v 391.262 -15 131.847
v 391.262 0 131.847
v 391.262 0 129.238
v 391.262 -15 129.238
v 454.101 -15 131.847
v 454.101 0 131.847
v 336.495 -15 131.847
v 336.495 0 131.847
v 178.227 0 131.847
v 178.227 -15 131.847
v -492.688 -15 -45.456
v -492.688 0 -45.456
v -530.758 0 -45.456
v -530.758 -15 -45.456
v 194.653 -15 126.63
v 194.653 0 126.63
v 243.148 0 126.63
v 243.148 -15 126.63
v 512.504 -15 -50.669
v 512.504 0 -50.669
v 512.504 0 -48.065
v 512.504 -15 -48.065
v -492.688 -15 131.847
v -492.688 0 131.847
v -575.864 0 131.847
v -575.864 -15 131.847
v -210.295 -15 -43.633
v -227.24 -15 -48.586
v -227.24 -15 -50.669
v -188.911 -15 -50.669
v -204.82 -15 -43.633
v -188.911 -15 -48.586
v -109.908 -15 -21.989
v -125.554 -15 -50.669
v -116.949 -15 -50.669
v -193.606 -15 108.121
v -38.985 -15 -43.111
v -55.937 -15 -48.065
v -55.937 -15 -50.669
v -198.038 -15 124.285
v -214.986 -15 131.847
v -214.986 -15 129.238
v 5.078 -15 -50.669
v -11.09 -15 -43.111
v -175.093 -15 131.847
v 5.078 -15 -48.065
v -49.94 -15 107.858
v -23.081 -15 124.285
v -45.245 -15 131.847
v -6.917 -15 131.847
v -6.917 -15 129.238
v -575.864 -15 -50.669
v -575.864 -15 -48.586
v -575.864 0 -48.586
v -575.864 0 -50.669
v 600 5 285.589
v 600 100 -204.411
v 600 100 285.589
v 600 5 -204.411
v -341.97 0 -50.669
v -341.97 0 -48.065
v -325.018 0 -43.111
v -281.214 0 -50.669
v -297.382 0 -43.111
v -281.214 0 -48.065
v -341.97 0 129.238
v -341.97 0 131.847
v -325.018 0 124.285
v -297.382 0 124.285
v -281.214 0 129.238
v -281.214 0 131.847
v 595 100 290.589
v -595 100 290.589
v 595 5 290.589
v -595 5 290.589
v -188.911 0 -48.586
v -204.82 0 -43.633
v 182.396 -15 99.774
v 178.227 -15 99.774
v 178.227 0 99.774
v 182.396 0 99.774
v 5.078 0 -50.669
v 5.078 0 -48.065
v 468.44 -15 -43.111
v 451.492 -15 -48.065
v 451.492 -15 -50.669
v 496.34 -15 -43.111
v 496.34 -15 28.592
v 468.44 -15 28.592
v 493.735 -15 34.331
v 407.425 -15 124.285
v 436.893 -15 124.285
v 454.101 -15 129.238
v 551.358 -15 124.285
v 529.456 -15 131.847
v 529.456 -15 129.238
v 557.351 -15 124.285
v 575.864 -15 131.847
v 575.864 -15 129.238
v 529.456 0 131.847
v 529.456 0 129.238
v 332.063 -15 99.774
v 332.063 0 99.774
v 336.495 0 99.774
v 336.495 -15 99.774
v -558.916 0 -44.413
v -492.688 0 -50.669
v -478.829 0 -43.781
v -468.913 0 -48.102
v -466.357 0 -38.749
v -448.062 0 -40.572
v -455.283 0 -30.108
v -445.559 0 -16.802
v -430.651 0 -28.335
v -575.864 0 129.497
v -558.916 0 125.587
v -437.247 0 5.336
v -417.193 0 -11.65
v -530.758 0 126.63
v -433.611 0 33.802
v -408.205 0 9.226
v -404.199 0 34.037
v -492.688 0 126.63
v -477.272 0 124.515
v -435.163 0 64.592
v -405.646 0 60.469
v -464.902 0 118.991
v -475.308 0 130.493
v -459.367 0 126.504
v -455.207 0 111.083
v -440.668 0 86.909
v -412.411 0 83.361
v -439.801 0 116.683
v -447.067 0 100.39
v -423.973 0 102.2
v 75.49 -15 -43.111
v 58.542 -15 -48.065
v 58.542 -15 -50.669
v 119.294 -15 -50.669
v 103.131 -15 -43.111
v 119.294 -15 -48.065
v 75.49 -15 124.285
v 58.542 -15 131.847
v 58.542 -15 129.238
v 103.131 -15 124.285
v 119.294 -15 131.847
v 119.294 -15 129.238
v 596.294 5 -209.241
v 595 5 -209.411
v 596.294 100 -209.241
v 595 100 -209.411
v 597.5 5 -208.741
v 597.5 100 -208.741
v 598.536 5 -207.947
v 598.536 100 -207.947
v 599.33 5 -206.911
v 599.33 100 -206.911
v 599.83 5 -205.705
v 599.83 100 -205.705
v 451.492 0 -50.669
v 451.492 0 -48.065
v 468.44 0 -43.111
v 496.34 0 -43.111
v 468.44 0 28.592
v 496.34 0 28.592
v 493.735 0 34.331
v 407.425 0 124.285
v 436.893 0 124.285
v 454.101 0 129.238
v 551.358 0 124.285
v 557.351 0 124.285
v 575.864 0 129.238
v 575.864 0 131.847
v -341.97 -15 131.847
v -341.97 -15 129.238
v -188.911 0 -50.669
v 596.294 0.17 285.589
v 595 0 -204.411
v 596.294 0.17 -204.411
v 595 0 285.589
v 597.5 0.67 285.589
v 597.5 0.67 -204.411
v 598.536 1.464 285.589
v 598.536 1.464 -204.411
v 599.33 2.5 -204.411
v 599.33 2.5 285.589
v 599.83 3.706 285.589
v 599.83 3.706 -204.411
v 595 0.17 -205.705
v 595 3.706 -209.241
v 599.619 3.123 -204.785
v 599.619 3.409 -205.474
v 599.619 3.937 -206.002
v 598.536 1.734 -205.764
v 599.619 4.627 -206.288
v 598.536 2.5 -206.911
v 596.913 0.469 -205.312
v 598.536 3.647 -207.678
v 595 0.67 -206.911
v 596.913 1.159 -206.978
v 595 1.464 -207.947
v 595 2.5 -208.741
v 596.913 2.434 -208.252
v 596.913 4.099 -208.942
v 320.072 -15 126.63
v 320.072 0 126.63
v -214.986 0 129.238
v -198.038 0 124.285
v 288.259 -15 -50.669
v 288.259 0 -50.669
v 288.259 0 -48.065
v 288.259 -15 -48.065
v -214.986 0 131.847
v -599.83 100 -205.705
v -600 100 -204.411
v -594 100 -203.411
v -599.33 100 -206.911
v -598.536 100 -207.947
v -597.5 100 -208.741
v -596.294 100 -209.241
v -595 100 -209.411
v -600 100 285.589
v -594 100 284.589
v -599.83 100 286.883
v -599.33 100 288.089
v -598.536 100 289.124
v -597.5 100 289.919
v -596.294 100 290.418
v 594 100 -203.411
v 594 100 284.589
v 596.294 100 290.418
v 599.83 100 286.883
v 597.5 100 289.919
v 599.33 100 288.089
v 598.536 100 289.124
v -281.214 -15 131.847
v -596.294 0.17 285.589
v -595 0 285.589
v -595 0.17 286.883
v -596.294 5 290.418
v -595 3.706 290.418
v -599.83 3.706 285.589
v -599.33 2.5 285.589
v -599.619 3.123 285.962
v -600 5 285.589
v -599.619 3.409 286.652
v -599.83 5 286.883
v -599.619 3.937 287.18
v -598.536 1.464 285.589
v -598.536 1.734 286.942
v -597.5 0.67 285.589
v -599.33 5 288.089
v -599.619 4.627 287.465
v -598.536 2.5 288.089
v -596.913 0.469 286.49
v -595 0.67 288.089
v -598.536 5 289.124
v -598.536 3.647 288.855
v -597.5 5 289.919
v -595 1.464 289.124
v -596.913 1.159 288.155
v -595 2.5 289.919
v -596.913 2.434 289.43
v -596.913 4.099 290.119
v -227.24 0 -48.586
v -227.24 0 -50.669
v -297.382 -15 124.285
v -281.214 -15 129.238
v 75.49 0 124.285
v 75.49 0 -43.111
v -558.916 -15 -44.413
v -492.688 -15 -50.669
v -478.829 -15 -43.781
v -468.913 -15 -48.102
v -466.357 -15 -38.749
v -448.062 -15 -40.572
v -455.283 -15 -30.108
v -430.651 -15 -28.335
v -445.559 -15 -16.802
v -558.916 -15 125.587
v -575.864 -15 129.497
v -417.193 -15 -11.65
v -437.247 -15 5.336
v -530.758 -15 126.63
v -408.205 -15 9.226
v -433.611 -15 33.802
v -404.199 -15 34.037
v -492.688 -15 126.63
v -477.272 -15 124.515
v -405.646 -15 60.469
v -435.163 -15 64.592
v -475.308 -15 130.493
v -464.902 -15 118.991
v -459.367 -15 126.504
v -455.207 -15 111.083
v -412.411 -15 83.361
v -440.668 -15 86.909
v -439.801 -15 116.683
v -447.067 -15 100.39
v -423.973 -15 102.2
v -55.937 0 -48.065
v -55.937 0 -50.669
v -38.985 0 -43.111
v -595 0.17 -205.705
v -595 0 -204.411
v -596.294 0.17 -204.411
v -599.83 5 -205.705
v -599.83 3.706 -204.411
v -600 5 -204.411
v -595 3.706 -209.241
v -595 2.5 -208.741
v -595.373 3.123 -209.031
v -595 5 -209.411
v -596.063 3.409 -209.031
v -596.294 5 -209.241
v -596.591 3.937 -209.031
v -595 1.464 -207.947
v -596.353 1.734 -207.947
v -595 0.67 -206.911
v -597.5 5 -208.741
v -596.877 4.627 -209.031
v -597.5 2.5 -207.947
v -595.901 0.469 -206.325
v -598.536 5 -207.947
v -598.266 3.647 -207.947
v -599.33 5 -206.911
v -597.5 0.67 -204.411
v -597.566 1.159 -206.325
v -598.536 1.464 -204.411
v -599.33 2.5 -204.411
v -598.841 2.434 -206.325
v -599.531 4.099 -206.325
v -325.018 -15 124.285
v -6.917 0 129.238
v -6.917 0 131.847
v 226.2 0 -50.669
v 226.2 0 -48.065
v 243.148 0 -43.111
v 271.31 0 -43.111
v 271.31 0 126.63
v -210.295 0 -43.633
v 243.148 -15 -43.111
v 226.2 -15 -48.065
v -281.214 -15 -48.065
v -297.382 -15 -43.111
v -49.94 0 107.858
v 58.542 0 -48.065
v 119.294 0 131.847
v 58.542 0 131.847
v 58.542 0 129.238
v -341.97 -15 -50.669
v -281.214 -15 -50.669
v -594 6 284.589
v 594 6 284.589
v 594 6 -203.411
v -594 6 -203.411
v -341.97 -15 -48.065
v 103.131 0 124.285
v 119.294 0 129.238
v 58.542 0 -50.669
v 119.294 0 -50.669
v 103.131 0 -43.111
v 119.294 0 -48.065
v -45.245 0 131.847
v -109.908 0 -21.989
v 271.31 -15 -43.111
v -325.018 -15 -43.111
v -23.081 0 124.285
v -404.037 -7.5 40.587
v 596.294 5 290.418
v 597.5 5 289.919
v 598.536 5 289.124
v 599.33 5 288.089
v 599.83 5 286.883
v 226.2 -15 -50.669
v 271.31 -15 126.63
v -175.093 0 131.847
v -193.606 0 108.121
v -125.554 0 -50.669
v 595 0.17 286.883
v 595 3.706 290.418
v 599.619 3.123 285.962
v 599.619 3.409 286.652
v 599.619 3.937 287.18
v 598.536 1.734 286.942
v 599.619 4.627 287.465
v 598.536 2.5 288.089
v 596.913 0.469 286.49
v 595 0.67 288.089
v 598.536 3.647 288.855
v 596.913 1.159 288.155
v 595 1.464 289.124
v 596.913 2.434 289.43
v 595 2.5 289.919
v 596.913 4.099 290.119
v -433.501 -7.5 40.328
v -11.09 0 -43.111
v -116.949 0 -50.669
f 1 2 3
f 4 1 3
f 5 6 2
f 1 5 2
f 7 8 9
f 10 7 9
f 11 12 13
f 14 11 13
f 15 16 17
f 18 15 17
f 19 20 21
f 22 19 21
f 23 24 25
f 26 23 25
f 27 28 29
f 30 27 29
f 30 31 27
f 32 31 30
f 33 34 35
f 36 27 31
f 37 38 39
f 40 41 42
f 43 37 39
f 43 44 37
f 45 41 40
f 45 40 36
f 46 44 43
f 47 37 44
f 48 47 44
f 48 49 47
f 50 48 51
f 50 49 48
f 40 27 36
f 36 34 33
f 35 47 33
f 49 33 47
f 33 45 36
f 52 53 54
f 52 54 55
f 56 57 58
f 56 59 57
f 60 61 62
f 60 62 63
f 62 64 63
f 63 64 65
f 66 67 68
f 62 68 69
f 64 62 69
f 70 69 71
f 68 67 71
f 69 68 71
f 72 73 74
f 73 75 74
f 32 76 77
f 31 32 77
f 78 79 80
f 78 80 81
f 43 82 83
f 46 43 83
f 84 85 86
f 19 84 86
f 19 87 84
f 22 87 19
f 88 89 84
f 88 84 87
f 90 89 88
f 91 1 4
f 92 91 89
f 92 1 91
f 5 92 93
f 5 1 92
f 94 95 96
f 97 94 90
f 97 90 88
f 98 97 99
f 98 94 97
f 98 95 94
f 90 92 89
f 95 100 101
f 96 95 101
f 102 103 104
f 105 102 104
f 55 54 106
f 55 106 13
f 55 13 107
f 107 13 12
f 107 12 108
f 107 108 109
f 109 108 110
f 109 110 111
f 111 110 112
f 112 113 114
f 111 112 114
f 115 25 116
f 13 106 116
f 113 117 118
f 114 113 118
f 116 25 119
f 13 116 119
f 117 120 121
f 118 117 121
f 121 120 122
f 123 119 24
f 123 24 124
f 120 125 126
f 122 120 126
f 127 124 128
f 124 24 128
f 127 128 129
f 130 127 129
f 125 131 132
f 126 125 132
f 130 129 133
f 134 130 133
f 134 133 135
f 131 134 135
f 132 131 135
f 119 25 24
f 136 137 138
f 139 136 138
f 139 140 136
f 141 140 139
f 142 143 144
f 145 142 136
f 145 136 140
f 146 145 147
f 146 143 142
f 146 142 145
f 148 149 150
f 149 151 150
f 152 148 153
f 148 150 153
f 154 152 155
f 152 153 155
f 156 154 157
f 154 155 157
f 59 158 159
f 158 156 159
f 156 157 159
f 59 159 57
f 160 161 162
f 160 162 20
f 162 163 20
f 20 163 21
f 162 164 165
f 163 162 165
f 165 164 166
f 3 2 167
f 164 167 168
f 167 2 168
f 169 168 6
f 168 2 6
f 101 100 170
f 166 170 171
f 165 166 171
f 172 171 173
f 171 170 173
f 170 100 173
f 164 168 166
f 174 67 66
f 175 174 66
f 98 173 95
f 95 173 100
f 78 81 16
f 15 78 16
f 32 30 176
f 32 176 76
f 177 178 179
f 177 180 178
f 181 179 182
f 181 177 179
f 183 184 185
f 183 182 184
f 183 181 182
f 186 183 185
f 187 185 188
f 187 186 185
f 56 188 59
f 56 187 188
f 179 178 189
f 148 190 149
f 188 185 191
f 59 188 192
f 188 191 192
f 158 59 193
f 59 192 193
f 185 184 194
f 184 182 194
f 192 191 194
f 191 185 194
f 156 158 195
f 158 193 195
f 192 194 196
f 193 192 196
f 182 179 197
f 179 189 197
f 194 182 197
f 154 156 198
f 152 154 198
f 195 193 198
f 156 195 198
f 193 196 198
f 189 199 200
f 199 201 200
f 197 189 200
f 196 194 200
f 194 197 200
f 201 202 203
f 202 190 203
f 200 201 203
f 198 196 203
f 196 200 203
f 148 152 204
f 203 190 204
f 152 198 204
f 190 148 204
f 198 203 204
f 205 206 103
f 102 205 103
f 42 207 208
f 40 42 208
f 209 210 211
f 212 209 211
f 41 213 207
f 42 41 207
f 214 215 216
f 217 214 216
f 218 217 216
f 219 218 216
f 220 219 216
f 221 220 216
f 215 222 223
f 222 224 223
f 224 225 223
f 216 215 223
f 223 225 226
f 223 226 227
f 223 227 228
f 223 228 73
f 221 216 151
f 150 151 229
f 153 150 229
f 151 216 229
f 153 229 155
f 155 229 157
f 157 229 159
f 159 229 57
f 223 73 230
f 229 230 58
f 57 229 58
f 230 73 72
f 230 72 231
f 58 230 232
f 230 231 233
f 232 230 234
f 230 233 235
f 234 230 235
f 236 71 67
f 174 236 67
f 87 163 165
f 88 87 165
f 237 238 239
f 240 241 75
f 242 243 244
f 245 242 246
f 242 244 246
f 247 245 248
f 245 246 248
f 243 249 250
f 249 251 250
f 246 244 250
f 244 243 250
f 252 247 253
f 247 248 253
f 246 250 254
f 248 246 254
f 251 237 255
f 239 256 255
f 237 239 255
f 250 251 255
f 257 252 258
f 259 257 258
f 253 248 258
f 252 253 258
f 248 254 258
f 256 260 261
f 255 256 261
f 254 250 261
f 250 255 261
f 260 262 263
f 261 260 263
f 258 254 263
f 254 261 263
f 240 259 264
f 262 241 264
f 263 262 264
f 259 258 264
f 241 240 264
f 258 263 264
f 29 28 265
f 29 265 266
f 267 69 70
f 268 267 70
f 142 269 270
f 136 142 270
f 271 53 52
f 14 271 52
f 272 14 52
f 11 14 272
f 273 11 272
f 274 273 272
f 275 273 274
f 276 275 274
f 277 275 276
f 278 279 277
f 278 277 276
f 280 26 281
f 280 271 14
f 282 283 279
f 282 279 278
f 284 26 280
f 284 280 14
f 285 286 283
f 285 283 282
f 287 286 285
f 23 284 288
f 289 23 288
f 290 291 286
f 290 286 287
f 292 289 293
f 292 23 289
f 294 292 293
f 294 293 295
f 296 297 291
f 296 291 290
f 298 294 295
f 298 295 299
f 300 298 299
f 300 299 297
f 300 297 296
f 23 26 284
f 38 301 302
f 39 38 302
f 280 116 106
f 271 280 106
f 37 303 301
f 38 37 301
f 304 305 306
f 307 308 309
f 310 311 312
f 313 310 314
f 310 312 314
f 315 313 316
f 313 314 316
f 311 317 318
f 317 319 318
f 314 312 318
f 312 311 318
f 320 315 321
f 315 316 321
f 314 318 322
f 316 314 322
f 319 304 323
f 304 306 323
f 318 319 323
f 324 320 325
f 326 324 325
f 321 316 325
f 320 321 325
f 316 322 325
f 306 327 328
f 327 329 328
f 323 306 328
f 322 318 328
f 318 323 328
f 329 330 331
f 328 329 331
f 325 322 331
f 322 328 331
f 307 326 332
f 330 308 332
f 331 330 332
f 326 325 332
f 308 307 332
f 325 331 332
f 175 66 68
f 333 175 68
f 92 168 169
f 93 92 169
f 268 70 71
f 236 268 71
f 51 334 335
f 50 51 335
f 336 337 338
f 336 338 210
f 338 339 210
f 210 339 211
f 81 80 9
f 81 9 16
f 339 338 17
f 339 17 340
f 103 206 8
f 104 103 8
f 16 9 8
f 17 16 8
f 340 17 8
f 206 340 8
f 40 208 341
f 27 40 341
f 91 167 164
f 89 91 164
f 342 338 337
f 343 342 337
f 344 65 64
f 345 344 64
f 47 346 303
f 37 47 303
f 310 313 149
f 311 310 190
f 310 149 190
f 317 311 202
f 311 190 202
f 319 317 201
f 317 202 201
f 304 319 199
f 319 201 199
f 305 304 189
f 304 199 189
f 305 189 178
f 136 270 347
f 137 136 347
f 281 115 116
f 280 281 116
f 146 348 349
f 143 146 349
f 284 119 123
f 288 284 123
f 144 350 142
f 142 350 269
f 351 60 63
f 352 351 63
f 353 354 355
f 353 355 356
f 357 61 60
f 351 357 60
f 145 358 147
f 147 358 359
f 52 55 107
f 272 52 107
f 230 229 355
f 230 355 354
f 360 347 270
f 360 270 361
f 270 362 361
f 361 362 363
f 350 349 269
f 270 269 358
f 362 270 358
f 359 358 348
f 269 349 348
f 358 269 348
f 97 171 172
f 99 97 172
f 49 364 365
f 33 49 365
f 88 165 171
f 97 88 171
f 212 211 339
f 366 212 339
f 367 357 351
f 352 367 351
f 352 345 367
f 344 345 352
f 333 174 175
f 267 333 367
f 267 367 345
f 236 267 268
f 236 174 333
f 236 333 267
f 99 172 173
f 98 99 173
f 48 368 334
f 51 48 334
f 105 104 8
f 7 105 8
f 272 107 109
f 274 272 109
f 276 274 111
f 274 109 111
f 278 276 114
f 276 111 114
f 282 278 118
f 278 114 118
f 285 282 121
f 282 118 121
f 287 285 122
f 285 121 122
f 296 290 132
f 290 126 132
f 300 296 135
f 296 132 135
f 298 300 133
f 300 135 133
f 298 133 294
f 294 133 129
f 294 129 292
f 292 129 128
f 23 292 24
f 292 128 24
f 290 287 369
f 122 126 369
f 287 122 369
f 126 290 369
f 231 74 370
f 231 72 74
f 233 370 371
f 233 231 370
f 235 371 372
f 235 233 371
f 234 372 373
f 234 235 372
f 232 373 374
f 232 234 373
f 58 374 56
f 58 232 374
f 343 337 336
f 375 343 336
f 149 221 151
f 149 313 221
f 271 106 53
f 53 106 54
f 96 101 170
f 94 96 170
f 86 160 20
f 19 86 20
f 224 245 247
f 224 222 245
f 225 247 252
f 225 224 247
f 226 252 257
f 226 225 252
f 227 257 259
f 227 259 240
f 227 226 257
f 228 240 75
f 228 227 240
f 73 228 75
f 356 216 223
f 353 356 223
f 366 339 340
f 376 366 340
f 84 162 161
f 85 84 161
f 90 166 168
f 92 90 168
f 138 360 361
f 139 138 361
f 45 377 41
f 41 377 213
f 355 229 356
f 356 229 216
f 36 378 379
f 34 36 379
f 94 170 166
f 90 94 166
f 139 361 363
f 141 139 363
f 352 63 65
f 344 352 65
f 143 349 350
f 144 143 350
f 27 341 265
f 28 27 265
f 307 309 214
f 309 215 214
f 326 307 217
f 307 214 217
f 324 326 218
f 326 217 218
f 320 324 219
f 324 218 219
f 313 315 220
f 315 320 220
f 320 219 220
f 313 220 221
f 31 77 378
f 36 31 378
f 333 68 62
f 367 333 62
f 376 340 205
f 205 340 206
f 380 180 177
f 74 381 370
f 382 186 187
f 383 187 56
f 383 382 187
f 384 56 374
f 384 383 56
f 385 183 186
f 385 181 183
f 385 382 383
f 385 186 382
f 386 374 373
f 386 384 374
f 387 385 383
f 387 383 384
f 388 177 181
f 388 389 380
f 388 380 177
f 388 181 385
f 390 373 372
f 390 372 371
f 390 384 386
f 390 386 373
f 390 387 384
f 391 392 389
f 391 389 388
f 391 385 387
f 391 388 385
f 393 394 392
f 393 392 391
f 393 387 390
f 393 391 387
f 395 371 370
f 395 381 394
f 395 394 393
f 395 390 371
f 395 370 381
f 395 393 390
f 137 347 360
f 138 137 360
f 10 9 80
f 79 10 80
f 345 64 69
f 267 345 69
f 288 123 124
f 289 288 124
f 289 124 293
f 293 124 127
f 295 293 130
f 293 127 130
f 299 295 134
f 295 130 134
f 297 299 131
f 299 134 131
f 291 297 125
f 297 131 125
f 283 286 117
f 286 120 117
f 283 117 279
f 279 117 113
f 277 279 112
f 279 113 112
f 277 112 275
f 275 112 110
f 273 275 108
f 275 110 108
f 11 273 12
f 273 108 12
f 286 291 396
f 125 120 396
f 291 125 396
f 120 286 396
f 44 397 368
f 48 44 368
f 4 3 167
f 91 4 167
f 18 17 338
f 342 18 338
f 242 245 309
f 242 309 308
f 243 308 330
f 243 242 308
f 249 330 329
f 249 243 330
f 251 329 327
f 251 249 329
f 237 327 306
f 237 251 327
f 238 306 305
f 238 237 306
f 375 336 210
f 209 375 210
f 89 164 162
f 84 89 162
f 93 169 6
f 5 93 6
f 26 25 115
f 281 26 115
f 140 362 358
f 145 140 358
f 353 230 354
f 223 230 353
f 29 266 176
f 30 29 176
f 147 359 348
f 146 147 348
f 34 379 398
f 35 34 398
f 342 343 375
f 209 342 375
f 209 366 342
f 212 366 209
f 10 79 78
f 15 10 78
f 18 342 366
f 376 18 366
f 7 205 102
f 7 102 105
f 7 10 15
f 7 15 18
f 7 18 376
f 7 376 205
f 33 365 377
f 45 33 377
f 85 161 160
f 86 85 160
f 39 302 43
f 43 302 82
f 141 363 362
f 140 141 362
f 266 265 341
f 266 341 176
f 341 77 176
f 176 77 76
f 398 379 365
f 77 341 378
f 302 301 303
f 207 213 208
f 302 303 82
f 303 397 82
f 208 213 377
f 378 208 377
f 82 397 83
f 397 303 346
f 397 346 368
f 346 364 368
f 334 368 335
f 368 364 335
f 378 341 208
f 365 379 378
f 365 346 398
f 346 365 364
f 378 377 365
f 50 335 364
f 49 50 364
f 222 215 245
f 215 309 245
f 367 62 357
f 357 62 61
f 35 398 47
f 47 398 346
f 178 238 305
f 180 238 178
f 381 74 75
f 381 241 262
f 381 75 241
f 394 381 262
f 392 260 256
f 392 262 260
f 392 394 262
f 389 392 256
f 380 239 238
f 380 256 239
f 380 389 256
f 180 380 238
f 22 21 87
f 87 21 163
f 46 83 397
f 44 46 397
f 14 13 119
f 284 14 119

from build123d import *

# Parameters (mm, degrees)
F1_DEPTH = 15
F2_W     = 1200
F2_H     = 500
F3_DEPTH = 100
F5_W     = 1188
F5_H     = 488
F6_DEPTH = 94
F7_R     = 5


with BuildPart() as f1:
    # F0 (on Front) → F1 (new body)
    with BuildSketch(Plane.XZ):
        with BuildLine():
            Line((-492.688128328, 131.8467284969), (-575.8642325067, 131.8467284969))
            Line((-575.8642325067, 131.8467284969), (-575.8642325067, 129.4973567609))
            Line((-575.8642325067, 129.4973567609), (-558.9160195401, 125.5868167992))
            Line((-558.9160195401, 125.5868167992), (-558.9160195401, -44.4131832008))
            Line((-558.9160195401, -44.4131832008), (-575.8642325067, -48.5864438502))
            Line((-575.8642325067, -48.5864438502), (-575.8642325067, -50.6692748381))
            Line((-575.8642325067, -50.6692748381), (-492.688128328, -50.6692748381))
            add(Edge.make_bspline(
                [(-492.688128328, -50.6692748381), (-440.5398678839, -50.6692748381), (-404.0365235328, -16.7765100838), (-404.0365235328, 40.5868167992)],
                knots=[0, 0, 0, 0, 1, 1, 1, 1], degree=3))
            add(Edge.make_bspline(
                [(-404.0365235328, 40.5868167992), (-404.0365235328, 97.4286398014), (-440.5398678839, 131.8467284969), (-492.688128328, 131.8467284969)],
                knots=[0, 0, 0, 0, 1, 1, 1, 1], degree=3))
        make_face()
        with BuildLine():
            Line((-530.7578425423, -45.4564880014), (-530.7578425423, 126.6301423233))
            Line((-530.7578425423, 126.6301423233), (-492.688128328, 126.6301423233))
            add(Edge.make_bspline(
                [(-492.688128328, 126.6301423233), (-458.2686649634, 126.6301423233), (-433.5007536503, 97.9495426962), (-433.5007536503, 40.3278954484)],
                knots=[0, 0, 0, 0, 1, 1, 1, 1], degree=3))
            add(Edge.make_bspline(
                [(-433.5007536503, 40.3278954484), (-433.5007536503, -17.0354314346), (-458.2686649634, -45.4564880014), (-492.688128328, -45.4564880014)],
                knots=[0, 0, 0, 0, 1, 1, 1, 1], degree=3))
            Line((-492.688128328, -45.4564880014), (-530.7578425423, -45.4564880014))
        make_face(mode=Mode.SUBTRACT)
    extrude(amount=F1_DEPTH)


with BuildPart() as f1b:
    # F0 (on Front) → F1, piece 2 (new body)
    with BuildSketch(Plane.XZ):
        Polygon((-281.214325751, 131.8467284969), (-341.9704949597, 131.8467284969), (-341.9704949597, 129.2384354101), (-325.0184757483, 124.2845699242), (-325.0184757483, -43.1109363259), (-341.9704949597, -48.0647810881), (-341.9704949597, -50.6692748381), (-281.214325751, -50.6692748381), (-281.214325751, -48.0647810881), (-297.381940789, -43.1109363259), (-297.381940789, 124.2845699242), (-281.214325751, 129.2384354101), align=None)
    extrude(amount=F1_DEPTH)


with BuildPart() as f1c:
    # F0 (on Front) → F1, piece 3 (new body)
    with BuildSketch(Plane.XZ):
        Polygon((-175.0928314113, 131.8467284969), (-214.986434539, 131.8467284969), (-214.986434539, 129.2384354101), (-198.0382215723, 124.2845699242), (-210.2953104643, -43.6325990879), (-227.2397240942, -48.5864438502), (-227.2397240942, -50.6692748381), (-188.9110885291, -50.6692748381), (-188.9110885291, -48.5864438502), (-204.8197960321, -43.6325990879), (-193.6060326642, 108.120754223), (-125.5542525388, -50.6692748381), (-116.948761534, -50.6692748381), (-49.9403069328, 107.8580128117), (-38.9854649157, -43.1109363259), (-55.9374772192, -48.0647810881), (-55.9374772192, -50.6692748381), (5.0776064324, -50.6692748381), (5.0776064324, -48.0647810881), (-11.0900293293, -43.1109363259), (-23.0805705653, 124.2845699242), (-6.9167410483, 129.2384354101), (-6.9167410483, 131.8467284969), (-45.2453766134, 131.8467284969), (-109.9082864471, -21.9894350783), align=None)
    extrude(amount=F1_DEPTH)


with BuildPart() as f1d:
    # F0 (on Front) → F1, piece 4 (new body)
    with BuildSketch(Plane.XZ):
        Polygon((119.2943339332, 131.8467284969), (58.5419709692, 131.8467284969), (58.5419709692, 129.2384354101), (75.4901839359, 124.2845699242), (75.4901839359, -43.1109363259), (58.5419709692, -48.0647810881), (58.5419709692, -50.6692748381), (119.2943339332, -50.6692748381), (119.2943339332, -48.0647810881), (103.1305251399, -43.1109363259), (103.1305251399, 124.2845699242), (119.2943339332, 129.2384354101), align=None)
    extrude(amount=F1_DEPTH)


with BuildPart() as f1e:
    # F0 (on Front) → F1, piece 5 (new body)
    with BuildSketch(Plane.XZ):
        Polygon((336.4949805275, 131.8467284969), (178.2266073206, 131.8467284969), (178.2266073206, 99.7742122006), (182.3960686332, 99.7742122006), (194.6531575252, 126.6301423233), (243.1484315972, 126.6301423233), (243.1484315972, -43.1109363259), (226.2002186305, -48.0647810881), (226.2002186305, -50.6692748381), (288.2586278063, -50.6692748381), (288.2586278063, -48.0647810881), (271.3104148396, -43.1109363259), (271.3104148396, 126.6301423233), (320.0722296597, 126.6301423233), (332.0627778036, 99.7742122006), (336.4949805275, 99.7742122006), align=None)
    extrude(amount=F1_DEPTH)


with BuildPart() as f1f:
    # F0 (on Front) → F1, piece 6 (new body)
    with BuildSketch(Plane.XZ):
        Polygon((454.1005852279, 131.8467284969), (391.2615712155, 131.8467284969), (391.2615712155, 129.2384354101), (407.4254007325, 124.2845699242), (468.440491292, 28.5924693184), (468.440491292, -43.1109363259), (451.4922921411, -48.0647810881), (451.4922921411, -50.6692748381), (512.5035764559, -50.6692748381), (512.5035764559, -48.0647810881), (496.339746939, -43.1109363259), (496.339746939, 28.5924693184), (557.3510312538, 124.2845699242), (575.8642325067, 129.2384354101), (575.8642325067, 131.8467284969), (529.4555956673, 131.8467284969), (529.4555956673, 129.2384354101), (551.3576533963, 124.2845699242), (493.735253189, 34.330718254), (436.8934301868, 124.2845699242), (454.1005852279, 129.2384354101), align=None)
    extrude(amount=F1_DEPTH)


with BuildPart() as f3:
    # F2 (on Front) → F3 (new body)
    with BuildSketch(Plane.XZ):
        with Locations((0, 40.5887284969)):
            Rectangle(F2_W, F2_H)
    extrude(amount=-F3_DEPTH)

    # F5 (on face) → F6 (cut)
    with BuildSketch(Plane(origin=(0, 100, 0), x_dir=(-1, 0, 0), z_dir=(0, 1, 0))):
        with Locations((0, 40.5887284969)):
            Rectangle(F5_W, F5_H)
    extrude(amount=-F6_DEPTH, mode=Mode.SUBTRACT)

    # F7
    f7_edges = [f3.edges().sort_by_distance(p)[0] for p in [
        (0, 0, 290.588728),
        (-600, 0, 40.588728),
        (0, 0, -209.411272),
        (600, 0, 40.588728),
        (600, 50, 290.588728),
        (600, 50, -209.411272),
        (-600, 50, 290.588728),
        (-600, 50, -209.411272),
    ]]
    fillet(f7_edges, radius=F7_R)


solid = Compound([f1.part, f1b.part, f1c.part, f1d.part, f1e.part, f1f.part, f3.part])
